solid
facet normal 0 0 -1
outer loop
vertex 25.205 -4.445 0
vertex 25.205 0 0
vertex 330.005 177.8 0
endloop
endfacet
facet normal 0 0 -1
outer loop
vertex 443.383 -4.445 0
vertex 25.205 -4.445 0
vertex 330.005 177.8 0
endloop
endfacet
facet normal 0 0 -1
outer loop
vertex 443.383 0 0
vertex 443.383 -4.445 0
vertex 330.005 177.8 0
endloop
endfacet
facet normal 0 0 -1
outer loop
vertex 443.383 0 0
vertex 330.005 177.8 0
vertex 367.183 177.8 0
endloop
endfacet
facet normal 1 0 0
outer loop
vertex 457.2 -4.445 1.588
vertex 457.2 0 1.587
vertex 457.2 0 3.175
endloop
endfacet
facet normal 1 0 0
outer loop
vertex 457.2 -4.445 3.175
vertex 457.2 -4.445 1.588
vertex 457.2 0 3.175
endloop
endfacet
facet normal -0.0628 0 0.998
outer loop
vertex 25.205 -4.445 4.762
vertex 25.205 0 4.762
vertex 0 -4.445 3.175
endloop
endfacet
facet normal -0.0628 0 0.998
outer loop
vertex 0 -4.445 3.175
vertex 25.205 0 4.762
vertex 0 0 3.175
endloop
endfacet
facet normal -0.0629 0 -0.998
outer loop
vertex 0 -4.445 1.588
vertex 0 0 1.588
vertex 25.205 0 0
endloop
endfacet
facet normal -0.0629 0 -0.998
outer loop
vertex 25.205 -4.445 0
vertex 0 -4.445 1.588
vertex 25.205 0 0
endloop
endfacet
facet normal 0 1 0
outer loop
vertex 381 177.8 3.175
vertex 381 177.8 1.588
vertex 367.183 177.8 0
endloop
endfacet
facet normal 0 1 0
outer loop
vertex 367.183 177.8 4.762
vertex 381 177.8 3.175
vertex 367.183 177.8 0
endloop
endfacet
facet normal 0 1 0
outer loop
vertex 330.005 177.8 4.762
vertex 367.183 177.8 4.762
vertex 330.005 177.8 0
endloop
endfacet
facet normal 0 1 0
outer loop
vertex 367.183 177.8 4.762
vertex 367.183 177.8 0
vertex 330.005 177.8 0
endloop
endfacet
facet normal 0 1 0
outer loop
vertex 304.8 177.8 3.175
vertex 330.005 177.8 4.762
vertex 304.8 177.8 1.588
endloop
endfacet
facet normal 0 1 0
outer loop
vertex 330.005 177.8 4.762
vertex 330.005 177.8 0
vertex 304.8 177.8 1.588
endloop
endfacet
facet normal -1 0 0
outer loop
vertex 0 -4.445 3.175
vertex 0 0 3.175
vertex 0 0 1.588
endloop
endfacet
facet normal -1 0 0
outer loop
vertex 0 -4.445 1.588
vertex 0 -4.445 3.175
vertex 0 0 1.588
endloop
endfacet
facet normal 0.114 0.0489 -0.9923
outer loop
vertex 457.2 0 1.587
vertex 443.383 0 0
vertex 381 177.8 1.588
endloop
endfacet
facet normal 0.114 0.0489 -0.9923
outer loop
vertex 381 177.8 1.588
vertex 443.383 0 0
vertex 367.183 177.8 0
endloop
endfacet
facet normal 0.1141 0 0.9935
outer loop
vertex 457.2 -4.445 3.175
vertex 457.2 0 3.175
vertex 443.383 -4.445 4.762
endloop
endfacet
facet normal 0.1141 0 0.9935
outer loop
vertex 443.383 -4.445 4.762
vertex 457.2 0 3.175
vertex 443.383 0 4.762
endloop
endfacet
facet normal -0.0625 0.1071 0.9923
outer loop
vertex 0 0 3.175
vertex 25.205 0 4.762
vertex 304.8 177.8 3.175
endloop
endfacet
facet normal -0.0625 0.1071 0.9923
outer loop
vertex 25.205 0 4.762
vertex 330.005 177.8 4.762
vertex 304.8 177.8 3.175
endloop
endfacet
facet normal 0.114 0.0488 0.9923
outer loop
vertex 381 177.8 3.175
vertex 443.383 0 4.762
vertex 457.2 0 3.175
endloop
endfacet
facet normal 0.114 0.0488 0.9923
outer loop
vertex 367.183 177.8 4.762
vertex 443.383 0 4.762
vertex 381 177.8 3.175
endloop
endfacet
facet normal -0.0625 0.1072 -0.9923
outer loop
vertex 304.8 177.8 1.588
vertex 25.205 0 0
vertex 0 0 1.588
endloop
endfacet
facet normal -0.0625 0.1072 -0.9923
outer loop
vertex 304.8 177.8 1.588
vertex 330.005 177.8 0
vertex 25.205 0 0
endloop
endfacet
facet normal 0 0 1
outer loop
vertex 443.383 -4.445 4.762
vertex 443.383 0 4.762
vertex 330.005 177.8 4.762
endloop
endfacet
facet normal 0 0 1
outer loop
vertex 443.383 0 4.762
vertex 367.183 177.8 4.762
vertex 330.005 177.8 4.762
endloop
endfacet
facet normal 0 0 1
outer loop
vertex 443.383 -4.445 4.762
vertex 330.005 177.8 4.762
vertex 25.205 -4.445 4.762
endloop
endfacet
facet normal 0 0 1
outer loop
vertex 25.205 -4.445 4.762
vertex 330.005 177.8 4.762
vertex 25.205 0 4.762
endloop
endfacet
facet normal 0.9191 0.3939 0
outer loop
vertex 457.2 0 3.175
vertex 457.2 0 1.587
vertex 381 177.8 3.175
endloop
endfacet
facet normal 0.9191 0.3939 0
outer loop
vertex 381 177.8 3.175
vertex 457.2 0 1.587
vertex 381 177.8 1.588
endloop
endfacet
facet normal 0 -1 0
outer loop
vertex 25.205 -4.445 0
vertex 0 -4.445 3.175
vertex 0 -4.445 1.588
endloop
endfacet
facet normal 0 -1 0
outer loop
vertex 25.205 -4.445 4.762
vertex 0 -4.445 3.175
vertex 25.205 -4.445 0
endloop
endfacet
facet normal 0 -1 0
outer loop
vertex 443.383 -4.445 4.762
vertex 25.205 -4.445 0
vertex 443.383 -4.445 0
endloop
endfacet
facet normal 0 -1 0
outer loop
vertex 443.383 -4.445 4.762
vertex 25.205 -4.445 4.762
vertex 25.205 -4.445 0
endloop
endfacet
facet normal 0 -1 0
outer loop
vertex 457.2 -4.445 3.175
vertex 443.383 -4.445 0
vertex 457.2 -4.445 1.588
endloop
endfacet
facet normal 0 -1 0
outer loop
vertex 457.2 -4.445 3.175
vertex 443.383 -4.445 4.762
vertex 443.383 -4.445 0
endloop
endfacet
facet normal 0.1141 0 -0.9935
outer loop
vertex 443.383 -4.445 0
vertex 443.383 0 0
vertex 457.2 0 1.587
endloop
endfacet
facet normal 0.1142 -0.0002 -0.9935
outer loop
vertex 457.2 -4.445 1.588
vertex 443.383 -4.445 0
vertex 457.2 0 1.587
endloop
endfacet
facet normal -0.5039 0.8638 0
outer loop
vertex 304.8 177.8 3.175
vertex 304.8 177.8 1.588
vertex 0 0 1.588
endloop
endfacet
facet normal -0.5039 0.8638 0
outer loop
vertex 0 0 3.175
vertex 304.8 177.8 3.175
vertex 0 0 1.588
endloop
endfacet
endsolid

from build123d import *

# Parameters (mm, degrees)
BOSS_EXTRUDE1_DEPTH = 4.7625
CHAMFER1_SIZE       = 1.5875
CHAMFER1_SIZE2      = 12.7
CHAMFER2_SIZE       = 1.5875
CHAMFER2_SIZE2      = 12.7
BOSS_EXTRUDE2_DEPTH = 4.445


with BuildPart() as part:
    # Sketch1 → Boss-Extrude1 (new body)
    with BuildSketch(Plane.XY):
        Polygon((0, 0), (457.2, 0), (381, 177.8), (304.8, 177.8), align=None)
    extrude(amount=BOSS_EXTRUDE1_DEPTH)

    # Chamfer1
    chamfer1_edges = [part.edges().sort_by_distance(p)[0] for p in [
        (152.4, 88.9, 4.7625),
        (152.4, 88.9, 0),
    ]]
    chamfer1_side = [part.faces().sort_by_distance(p)[0] for p in [
        (152.4, 88.9, 2.38125),
    ]]
    chamfer(chamfer1_edges, length=CHAMFER1_SIZE, length2=CHAMFER1_SIZE2, reference=chamfer1_side[0])

    # Chamfer2
    chamfer2_edges = [part.edges().sort_by_distance(p)[0] for p in [
        (419.1, 88.9, 4.7625),
        (419.1, 88.9, 0),
    ]]
    chamfer2_side = [part.faces().sort_by_distance(p)[0] for p in [
        (419.1, 88.9, 2.38125),
    ]]
    chamfer(chamfer2_edges, length=CHAMFER2_SIZE, length2=CHAMFER2_SIZE2, reference=chamfer2_side[0])

    # Sketch2 → Boss-Extrude2 (add)
    with BuildSketch(Plane.XZ):
        Polygon((25.204862667, 0), (443.382811651, 0), (457.2, 1.5875), (457.2, 3.175), (443.382811651, 4.7625), (25.204862667, 4.7625), (0, 3.175), (0, 1.5875), align=None)
    extrude(amount=BOSS_EXTRUDE2_DEPTH)


solid = part.part
